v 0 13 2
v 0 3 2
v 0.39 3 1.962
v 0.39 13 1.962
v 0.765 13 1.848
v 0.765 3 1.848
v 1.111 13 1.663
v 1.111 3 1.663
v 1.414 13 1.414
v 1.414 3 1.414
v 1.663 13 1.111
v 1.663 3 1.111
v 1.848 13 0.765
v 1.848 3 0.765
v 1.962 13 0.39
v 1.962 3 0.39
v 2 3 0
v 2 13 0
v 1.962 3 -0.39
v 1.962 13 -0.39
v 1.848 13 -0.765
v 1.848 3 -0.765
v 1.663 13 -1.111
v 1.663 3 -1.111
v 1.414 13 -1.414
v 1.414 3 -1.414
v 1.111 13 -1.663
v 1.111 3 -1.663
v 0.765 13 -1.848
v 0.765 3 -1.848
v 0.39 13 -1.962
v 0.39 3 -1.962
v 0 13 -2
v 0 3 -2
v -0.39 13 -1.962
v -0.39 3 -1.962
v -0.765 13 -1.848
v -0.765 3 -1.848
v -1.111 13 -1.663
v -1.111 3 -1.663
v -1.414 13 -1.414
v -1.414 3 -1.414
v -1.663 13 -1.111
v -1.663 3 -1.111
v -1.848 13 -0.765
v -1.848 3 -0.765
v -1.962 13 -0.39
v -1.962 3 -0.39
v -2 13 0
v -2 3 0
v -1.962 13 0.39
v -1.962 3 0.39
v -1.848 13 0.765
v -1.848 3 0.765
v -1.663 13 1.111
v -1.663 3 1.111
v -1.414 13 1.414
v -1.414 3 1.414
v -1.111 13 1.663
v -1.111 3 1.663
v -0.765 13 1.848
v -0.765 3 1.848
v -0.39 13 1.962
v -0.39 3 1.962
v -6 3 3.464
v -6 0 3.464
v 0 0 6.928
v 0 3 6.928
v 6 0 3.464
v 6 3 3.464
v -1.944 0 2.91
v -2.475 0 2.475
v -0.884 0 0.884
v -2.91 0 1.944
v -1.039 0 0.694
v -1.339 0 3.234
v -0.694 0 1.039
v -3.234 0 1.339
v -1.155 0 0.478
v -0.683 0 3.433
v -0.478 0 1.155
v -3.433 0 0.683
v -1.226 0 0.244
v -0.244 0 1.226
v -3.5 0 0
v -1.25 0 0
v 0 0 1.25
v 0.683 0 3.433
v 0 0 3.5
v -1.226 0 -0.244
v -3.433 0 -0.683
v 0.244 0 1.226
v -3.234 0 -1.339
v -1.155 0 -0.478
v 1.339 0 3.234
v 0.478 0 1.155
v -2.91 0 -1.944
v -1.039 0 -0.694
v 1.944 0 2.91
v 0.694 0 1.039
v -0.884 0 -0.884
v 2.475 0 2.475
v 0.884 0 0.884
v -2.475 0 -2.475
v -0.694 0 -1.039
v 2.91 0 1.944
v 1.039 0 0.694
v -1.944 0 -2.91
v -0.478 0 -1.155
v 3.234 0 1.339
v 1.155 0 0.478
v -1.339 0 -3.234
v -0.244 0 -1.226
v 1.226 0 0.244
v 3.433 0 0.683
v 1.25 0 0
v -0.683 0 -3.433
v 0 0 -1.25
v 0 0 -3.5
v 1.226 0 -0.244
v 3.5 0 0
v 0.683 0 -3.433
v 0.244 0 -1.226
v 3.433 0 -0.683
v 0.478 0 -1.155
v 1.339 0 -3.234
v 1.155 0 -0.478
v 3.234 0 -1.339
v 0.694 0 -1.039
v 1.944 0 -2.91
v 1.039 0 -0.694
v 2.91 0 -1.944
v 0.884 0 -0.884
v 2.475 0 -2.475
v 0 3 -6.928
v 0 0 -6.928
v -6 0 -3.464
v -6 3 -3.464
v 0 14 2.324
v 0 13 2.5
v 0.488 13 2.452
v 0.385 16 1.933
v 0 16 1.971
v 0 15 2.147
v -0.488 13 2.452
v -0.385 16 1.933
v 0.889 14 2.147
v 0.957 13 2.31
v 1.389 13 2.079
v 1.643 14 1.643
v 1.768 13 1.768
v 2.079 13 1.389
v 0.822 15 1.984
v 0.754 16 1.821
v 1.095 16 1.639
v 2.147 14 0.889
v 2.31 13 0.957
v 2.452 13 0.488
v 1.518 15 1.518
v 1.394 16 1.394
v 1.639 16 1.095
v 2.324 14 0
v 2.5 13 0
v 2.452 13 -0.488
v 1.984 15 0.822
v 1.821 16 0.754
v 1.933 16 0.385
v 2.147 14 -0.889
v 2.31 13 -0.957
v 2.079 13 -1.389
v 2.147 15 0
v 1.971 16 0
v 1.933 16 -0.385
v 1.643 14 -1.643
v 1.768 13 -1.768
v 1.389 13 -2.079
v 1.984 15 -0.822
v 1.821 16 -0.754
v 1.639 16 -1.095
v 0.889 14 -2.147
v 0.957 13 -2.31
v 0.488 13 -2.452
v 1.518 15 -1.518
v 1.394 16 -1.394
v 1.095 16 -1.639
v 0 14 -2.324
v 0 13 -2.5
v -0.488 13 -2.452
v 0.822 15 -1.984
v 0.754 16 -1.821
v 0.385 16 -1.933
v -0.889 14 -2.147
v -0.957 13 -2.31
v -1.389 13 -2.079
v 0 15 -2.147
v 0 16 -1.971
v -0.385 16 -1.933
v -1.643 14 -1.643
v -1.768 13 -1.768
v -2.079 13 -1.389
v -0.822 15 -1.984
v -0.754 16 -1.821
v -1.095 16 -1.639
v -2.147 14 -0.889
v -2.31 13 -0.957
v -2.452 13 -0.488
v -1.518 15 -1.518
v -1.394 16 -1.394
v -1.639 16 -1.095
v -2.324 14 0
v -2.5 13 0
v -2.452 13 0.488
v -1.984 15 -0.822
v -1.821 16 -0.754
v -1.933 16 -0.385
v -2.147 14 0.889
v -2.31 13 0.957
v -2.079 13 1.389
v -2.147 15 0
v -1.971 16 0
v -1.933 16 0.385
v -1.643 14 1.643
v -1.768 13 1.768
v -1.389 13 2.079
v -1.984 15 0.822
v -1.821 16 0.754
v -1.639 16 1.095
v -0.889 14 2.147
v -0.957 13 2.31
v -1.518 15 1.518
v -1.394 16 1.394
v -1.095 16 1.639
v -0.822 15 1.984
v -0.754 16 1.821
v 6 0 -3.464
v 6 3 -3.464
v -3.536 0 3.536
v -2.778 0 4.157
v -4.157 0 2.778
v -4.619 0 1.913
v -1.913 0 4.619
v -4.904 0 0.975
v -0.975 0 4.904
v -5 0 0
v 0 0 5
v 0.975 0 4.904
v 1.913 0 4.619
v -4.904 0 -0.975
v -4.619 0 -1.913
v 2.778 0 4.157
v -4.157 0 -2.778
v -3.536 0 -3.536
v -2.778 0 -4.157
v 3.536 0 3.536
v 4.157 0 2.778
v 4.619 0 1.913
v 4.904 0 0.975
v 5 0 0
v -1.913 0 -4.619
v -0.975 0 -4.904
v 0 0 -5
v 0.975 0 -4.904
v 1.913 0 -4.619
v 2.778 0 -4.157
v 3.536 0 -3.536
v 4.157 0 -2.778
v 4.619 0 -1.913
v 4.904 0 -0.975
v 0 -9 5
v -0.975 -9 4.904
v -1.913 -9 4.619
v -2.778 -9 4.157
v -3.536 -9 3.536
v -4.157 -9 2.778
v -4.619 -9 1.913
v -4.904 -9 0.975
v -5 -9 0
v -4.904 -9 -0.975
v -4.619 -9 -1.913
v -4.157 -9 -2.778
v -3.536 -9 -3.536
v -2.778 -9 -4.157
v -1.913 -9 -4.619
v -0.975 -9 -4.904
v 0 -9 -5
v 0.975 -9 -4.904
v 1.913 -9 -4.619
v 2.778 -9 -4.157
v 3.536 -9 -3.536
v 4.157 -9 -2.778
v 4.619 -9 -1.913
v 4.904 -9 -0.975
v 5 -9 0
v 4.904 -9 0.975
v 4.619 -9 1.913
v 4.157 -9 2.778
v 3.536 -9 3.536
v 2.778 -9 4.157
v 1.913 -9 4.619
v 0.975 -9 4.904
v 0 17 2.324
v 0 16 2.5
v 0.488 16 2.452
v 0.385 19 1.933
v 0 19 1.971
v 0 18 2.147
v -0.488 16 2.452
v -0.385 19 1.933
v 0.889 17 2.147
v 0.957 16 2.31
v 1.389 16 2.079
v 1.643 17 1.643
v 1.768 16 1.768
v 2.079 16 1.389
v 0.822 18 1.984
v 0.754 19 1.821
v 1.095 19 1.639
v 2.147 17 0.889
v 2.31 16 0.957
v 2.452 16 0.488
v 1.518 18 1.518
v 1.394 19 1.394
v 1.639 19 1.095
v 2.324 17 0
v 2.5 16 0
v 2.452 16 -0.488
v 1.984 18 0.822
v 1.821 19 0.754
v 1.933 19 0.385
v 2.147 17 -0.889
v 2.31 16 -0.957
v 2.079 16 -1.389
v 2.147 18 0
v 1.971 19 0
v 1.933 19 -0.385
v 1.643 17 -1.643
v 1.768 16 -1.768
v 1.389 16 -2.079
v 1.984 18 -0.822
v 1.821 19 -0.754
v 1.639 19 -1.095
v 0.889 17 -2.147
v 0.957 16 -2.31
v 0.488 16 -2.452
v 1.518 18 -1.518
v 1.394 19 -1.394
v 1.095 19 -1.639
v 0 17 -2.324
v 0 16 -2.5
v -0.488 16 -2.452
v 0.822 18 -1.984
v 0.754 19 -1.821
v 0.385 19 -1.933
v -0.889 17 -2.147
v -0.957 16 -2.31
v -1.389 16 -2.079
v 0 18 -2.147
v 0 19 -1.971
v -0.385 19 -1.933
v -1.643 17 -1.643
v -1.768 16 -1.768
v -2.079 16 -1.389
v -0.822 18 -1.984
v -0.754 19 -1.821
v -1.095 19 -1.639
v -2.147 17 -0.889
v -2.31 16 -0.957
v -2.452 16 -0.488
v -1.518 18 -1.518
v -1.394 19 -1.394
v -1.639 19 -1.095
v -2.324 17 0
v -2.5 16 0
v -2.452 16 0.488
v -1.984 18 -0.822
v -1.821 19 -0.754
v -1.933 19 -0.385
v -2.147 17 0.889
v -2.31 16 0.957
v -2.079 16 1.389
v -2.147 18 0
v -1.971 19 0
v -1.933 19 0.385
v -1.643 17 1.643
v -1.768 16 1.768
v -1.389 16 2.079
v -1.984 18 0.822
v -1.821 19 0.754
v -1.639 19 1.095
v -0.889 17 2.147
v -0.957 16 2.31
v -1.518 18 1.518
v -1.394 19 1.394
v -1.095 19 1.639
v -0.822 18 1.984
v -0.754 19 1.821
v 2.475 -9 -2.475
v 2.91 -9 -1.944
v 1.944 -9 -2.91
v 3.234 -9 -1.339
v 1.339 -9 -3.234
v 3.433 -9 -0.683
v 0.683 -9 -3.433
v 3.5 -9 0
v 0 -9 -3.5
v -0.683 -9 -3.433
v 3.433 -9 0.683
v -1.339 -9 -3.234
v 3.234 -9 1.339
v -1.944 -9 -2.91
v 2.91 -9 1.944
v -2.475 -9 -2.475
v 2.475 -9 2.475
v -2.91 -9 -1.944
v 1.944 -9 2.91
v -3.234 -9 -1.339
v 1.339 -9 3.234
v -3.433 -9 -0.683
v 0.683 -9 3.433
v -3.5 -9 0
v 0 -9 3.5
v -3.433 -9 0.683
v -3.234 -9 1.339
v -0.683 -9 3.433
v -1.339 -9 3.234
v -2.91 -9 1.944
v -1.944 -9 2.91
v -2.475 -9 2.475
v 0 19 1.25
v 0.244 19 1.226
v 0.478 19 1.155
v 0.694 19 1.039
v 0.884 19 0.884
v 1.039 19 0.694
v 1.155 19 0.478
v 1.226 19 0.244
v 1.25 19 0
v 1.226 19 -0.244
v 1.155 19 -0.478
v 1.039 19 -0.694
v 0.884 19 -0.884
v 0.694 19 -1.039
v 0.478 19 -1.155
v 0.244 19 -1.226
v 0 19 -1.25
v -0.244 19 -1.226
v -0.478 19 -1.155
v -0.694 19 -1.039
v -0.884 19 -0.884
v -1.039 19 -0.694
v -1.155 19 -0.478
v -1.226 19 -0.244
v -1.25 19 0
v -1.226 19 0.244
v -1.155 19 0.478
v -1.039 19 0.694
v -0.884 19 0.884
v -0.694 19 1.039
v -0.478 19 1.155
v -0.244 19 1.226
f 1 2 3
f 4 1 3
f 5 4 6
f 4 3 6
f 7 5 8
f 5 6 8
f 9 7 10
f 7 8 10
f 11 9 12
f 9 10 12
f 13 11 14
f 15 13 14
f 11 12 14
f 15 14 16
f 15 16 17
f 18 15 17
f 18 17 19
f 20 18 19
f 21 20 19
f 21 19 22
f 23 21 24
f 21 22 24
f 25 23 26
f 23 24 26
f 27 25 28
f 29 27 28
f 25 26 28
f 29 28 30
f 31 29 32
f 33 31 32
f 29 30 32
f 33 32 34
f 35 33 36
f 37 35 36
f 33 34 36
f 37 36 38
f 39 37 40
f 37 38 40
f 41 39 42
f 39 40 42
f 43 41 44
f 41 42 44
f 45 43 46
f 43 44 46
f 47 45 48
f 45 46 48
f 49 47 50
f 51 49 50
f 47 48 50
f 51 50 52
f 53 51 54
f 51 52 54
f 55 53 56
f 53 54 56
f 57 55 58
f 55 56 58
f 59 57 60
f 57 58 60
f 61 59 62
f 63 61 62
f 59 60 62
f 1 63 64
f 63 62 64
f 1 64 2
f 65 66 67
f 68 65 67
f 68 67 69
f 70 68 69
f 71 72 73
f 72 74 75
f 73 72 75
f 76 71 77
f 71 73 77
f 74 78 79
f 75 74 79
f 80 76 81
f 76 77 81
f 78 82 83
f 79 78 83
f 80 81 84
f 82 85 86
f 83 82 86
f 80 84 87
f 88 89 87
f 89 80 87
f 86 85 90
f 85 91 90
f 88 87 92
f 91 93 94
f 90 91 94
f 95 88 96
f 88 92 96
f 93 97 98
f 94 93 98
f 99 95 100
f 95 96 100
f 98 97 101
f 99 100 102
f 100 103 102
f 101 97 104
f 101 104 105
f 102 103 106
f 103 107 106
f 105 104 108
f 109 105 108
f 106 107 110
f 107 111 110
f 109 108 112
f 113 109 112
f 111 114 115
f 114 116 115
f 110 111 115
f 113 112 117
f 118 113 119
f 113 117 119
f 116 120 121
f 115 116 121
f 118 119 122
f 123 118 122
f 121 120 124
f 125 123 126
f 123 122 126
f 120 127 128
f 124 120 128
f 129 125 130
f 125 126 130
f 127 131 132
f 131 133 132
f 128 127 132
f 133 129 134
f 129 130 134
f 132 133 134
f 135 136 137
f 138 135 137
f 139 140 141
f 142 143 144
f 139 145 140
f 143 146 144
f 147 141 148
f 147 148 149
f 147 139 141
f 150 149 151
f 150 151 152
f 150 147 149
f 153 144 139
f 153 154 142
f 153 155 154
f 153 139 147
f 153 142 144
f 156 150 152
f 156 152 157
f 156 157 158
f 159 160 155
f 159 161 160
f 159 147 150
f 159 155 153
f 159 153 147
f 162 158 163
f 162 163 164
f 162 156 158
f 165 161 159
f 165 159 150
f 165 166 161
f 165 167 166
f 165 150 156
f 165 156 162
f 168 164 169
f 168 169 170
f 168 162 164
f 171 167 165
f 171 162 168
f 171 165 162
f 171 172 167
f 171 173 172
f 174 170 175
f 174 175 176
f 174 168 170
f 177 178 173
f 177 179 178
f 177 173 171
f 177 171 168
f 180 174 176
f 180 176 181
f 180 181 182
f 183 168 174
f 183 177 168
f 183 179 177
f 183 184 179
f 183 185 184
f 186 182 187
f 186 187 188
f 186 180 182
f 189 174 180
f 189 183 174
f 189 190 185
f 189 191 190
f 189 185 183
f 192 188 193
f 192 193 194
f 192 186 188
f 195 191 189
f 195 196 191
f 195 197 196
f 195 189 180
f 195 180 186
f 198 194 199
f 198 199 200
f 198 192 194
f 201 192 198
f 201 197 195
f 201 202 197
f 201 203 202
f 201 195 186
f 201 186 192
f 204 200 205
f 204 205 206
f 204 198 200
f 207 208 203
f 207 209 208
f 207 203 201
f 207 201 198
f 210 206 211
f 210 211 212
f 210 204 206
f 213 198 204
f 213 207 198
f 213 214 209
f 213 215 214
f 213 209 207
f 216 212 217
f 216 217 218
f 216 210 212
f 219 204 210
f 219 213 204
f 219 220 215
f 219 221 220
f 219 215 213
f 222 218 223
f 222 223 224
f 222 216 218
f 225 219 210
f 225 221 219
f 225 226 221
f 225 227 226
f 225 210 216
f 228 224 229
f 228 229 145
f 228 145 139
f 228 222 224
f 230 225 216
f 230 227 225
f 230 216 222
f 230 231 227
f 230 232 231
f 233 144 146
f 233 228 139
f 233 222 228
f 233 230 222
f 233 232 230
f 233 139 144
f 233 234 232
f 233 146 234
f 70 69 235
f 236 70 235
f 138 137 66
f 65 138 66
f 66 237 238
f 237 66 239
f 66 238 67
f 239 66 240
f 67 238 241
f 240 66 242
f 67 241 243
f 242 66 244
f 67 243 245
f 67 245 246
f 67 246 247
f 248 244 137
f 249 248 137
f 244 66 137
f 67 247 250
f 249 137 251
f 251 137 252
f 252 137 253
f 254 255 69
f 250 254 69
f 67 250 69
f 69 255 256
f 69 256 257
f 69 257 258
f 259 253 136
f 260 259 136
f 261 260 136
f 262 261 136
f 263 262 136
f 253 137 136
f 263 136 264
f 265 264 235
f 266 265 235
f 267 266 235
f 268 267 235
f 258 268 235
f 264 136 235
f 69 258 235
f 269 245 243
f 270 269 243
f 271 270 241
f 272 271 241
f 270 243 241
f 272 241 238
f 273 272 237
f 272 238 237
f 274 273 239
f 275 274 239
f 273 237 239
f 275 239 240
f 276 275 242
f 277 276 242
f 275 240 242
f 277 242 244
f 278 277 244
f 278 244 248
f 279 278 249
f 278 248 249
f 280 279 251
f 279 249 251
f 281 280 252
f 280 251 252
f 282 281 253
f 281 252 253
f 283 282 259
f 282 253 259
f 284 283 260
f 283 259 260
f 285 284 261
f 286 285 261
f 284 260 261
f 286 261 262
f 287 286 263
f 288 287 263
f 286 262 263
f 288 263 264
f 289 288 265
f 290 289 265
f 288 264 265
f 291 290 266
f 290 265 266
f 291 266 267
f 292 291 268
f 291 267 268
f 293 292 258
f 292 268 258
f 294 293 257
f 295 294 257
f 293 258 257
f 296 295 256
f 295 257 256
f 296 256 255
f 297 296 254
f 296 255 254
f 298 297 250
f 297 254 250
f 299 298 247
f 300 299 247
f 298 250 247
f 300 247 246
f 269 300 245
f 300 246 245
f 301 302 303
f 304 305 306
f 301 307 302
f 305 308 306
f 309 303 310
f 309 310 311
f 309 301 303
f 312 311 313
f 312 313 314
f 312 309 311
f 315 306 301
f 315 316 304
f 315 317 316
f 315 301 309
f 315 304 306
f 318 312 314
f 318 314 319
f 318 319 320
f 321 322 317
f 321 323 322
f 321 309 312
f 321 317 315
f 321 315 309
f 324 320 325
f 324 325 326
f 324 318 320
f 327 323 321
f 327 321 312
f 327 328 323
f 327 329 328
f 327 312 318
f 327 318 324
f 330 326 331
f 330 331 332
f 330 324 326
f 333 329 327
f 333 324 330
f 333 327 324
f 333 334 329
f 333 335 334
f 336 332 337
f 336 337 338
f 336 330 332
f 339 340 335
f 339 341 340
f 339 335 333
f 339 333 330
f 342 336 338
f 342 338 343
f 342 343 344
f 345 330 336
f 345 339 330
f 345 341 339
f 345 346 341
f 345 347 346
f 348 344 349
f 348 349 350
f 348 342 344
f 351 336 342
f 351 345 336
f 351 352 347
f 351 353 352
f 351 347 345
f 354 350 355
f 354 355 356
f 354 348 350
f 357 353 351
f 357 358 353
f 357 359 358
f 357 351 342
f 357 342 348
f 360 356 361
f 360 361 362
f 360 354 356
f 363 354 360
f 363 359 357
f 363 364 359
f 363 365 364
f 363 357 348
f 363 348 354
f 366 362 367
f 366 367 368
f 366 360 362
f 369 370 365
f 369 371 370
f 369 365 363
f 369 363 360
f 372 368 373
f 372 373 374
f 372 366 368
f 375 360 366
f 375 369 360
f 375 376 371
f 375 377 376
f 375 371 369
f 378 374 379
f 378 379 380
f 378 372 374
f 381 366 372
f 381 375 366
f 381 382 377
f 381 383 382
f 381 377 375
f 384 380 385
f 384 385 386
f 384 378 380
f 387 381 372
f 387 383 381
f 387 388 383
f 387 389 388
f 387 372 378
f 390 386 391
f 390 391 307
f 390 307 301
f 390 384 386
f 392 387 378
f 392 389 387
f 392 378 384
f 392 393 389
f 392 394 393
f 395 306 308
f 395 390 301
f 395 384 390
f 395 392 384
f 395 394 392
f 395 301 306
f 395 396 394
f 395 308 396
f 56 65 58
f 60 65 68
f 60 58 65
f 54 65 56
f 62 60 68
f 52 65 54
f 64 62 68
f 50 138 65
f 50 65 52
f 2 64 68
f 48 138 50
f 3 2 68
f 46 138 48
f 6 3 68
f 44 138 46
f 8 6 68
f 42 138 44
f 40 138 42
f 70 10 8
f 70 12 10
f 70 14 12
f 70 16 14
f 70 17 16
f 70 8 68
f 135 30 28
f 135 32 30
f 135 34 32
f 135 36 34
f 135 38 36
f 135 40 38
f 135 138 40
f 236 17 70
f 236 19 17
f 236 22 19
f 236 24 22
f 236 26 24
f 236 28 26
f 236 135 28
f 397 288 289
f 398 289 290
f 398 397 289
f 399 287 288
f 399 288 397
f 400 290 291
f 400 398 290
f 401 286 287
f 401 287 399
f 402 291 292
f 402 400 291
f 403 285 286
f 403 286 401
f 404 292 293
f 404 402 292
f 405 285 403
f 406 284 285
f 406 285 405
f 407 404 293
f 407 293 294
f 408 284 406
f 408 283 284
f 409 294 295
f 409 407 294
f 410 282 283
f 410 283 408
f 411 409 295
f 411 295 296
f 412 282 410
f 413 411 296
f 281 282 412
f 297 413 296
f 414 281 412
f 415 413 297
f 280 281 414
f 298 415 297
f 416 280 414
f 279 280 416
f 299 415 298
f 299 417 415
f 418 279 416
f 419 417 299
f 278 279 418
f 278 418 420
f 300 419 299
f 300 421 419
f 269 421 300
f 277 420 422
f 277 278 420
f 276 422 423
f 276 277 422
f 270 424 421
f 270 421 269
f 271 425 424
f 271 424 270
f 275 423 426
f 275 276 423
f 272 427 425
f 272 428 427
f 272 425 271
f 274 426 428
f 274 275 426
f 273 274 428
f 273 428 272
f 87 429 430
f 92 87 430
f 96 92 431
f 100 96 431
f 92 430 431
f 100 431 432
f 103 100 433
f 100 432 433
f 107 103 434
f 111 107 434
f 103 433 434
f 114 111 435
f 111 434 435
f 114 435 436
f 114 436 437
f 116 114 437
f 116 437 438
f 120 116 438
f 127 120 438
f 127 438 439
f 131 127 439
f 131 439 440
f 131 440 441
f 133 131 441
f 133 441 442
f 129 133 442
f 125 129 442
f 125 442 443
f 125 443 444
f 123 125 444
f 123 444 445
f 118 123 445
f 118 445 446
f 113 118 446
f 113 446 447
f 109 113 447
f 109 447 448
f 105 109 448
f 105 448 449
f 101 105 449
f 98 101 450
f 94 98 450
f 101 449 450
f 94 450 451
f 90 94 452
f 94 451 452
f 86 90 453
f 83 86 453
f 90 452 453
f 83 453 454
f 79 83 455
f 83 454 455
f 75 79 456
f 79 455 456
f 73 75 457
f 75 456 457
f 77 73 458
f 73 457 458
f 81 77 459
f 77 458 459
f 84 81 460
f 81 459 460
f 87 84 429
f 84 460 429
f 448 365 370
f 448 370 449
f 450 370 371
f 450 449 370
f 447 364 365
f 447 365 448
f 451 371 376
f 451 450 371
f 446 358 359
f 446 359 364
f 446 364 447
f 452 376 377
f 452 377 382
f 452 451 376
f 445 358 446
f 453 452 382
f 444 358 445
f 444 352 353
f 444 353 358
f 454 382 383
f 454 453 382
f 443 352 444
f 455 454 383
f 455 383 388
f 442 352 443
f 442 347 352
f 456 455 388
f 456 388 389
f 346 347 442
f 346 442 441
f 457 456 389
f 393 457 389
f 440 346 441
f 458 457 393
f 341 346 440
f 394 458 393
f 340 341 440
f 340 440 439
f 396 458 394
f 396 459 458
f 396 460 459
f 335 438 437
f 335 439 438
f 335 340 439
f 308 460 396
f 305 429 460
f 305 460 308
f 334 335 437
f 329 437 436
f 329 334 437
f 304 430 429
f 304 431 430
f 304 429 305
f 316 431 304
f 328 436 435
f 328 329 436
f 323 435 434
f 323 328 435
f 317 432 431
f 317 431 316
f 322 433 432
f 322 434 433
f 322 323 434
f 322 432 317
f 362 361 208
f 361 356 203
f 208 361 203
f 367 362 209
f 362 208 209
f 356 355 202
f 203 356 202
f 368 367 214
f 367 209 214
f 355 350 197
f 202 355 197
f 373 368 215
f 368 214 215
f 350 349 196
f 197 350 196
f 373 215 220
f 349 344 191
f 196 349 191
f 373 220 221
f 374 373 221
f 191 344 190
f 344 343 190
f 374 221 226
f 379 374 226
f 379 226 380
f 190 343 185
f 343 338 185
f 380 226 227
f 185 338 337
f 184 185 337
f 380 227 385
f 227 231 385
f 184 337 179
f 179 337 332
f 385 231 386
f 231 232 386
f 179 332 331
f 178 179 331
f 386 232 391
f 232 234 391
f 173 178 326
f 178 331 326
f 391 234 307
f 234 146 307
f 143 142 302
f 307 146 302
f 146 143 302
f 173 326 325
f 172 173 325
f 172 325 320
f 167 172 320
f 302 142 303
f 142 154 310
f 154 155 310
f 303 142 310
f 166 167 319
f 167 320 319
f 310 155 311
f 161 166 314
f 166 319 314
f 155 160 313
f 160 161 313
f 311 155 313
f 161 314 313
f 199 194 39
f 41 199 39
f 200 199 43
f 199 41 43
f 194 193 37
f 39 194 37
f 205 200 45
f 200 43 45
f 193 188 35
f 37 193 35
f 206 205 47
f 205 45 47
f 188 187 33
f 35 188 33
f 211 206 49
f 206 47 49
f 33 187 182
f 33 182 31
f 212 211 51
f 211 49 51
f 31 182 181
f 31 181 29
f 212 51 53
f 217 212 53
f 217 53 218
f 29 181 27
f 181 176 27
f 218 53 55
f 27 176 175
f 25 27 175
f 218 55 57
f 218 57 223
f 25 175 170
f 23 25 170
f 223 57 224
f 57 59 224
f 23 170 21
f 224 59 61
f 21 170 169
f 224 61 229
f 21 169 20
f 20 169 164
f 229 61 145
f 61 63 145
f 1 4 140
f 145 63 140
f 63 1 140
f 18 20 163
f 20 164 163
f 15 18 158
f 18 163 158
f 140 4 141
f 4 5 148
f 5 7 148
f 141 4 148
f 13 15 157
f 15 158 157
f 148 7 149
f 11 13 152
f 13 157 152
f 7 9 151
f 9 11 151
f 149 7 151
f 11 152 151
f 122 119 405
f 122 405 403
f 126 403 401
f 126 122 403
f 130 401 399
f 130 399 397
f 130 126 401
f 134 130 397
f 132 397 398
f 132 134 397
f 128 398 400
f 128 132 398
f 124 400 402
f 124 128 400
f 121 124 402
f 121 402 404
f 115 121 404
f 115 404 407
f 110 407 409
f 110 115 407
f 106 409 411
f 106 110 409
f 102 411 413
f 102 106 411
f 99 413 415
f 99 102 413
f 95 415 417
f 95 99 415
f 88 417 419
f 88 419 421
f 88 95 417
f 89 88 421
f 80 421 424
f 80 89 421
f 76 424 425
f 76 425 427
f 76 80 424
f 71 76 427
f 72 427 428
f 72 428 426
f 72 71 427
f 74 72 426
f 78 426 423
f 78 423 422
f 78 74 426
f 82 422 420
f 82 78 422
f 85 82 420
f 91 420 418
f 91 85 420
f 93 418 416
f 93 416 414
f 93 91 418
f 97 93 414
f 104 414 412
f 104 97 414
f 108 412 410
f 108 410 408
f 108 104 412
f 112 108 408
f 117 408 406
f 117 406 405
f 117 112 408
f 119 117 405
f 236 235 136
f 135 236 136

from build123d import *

# Parameters (mm, degrees)
EXTRUSION1_DEPTH  = 3
ESQUISSE3_R       = 5
ESQUISSE3_R_2     = 3.5
EXTRUSION2_DEPTH  = 9
ESQUISSE4_R       = 2
EXTRUSION3_DEPTH  = 10
ESQUISSE5_R       = 2.5
EXTRUSION4_DEPTH  = 3
CHANFREIN1_SIZE   = 3
CHANFREIN1_SIZE_2 = 0.528980942
ESQUISSE6_R       = 2.5
EXTRUSION5_DEPTH  = 3
CHANFREIN2_SIZE   = 3
CHANFREIN2_SIZE_2 = 0.528980942
EXTRUSION6_REACH  = 31.462
ESQUISSE7_R       = 1.25


with BuildPart() as part:
    # Esquisse2 → Extrusion1 (new body)
    with BuildSketch(Plane(origin=(0, 0, 0), x_dir=(1, 0, 0), z_dir=(0, 1, 0))):
        Polygon((0, 6.92820323), (-6, 3.464101615), (-6, -3.464101615), (0, -6.92820323), (6, -3.464101615), (6, 3.464101615), align=None)
    extrude(amount=EXTRUSION1_DEPTH)

    # Esquisse3 → Extrusion2 (add)
    with BuildSketch(Plane.XZ):
        with Locations(Location((0, 0, 0), (0, 0, 90))):
            Circle(ESQUISSE3_R)
        with Locations(Location((0, 0, 0), (0, 0, 270))):
            Circle(ESQUISSE3_R_2, mode=Mode.SUBTRACT)
    extrude(amount=EXTRUSION2_DEPTH)

    # Esquisse4 → Extrusion3 (add)
    with BuildSketch(Plane(origin=(0, 3, 0), x_dir=(-1, 0, 0), z_dir=(0, 1, 0))):
        with Locations(Location((0, 0, 0), (0, 0, 90))):
            Circle(ESQUISSE4_R)
    extrude(amount=EXTRUSION3_DEPTH)

    # Esquisse5 → Extrusion4 (add)
    with BuildSketch(Plane(origin=(0, 13, 0), x_dir=(1, 0, 0), z_dir=(0, 1, 0))):
        with Locations(Location((0, 0, 0), (0, 0, 270))):
            Circle(ESQUISSE5_R)
    extrude(amount=EXTRUSION4_DEPTH)

    # Chanfrein1
    # the kernel refuses this chamfer: 3, 0.528980942 mm, written as the material it takes off along each edge
    with BuildSketch(Plane(origin=(0, 16, 0), x_dir=(0, 0, 1), z_dir=(-1, 0, 0))) as chanfrein1_piece_1:
        Polygon((2.5, -CHANFREIN1_SIZE), (2.5 - CHANFREIN1_SIZE_2, 0), (2.5, 0), align=None)
    revolve(axis=Axis((0, 16, 0), (0, 1, 0)), mode=Mode.SUBTRACT)

    # Esquisse6 → Extrusion5 (add)
    with BuildSketch(Plane(origin=(0, 16, 0), x_dir=(1, 0, 0), z_dir=(0, 1, 0))):
        with Locations(Location((0, 0, 0), (0, 0, 270))):
            Circle(ESQUISSE6_R)
    extrude(amount=EXTRUSION5_DEPTH)

    # Chanfrein2
    # the kernel refuses this chamfer: 3, 0.528980942 mm, written as the material it takes off along each edge
    with BuildSketch(Plane(origin=(0, 19, 0), x_dir=(0, 0, 1), z_dir=(-1, 0, 0))) as chanfrein2_piece_1:
        Polygon((2.5, -CHANFREIN2_SIZE), (2.5 - CHANFREIN2_SIZE_2, 0), (2.5, 0), align=None)
    revolve(axis=Axis((0, 19, 0), (0, 1, 0)), mode=Mode.SUBTRACT)

    # Esquisse7 → Extrusion6 (cut, up to next)
    with BuildSketch(Plane(origin=(0, 19, 0), x_dir=(1, 0, 0), z_dir=(0, 1, 0)), mode=Mode.PRIVATE) as extrusion6_sk1:
        with Locations(Location((0, 0, 0), (0, 0, 270))):
            Circle(ESQUISSE7_R)
    extrusion6_tool1 = extrude(extrusion6_sk1.sketch, amount=-EXTRUSION6_REACH, mode=Mode.PRIVATE) & part.part
    add(extrusion6_tool1.solids().sort_by_distance((0, 19, 0))[0], mode=Mode.SUBTRACT)


solid = part.part
